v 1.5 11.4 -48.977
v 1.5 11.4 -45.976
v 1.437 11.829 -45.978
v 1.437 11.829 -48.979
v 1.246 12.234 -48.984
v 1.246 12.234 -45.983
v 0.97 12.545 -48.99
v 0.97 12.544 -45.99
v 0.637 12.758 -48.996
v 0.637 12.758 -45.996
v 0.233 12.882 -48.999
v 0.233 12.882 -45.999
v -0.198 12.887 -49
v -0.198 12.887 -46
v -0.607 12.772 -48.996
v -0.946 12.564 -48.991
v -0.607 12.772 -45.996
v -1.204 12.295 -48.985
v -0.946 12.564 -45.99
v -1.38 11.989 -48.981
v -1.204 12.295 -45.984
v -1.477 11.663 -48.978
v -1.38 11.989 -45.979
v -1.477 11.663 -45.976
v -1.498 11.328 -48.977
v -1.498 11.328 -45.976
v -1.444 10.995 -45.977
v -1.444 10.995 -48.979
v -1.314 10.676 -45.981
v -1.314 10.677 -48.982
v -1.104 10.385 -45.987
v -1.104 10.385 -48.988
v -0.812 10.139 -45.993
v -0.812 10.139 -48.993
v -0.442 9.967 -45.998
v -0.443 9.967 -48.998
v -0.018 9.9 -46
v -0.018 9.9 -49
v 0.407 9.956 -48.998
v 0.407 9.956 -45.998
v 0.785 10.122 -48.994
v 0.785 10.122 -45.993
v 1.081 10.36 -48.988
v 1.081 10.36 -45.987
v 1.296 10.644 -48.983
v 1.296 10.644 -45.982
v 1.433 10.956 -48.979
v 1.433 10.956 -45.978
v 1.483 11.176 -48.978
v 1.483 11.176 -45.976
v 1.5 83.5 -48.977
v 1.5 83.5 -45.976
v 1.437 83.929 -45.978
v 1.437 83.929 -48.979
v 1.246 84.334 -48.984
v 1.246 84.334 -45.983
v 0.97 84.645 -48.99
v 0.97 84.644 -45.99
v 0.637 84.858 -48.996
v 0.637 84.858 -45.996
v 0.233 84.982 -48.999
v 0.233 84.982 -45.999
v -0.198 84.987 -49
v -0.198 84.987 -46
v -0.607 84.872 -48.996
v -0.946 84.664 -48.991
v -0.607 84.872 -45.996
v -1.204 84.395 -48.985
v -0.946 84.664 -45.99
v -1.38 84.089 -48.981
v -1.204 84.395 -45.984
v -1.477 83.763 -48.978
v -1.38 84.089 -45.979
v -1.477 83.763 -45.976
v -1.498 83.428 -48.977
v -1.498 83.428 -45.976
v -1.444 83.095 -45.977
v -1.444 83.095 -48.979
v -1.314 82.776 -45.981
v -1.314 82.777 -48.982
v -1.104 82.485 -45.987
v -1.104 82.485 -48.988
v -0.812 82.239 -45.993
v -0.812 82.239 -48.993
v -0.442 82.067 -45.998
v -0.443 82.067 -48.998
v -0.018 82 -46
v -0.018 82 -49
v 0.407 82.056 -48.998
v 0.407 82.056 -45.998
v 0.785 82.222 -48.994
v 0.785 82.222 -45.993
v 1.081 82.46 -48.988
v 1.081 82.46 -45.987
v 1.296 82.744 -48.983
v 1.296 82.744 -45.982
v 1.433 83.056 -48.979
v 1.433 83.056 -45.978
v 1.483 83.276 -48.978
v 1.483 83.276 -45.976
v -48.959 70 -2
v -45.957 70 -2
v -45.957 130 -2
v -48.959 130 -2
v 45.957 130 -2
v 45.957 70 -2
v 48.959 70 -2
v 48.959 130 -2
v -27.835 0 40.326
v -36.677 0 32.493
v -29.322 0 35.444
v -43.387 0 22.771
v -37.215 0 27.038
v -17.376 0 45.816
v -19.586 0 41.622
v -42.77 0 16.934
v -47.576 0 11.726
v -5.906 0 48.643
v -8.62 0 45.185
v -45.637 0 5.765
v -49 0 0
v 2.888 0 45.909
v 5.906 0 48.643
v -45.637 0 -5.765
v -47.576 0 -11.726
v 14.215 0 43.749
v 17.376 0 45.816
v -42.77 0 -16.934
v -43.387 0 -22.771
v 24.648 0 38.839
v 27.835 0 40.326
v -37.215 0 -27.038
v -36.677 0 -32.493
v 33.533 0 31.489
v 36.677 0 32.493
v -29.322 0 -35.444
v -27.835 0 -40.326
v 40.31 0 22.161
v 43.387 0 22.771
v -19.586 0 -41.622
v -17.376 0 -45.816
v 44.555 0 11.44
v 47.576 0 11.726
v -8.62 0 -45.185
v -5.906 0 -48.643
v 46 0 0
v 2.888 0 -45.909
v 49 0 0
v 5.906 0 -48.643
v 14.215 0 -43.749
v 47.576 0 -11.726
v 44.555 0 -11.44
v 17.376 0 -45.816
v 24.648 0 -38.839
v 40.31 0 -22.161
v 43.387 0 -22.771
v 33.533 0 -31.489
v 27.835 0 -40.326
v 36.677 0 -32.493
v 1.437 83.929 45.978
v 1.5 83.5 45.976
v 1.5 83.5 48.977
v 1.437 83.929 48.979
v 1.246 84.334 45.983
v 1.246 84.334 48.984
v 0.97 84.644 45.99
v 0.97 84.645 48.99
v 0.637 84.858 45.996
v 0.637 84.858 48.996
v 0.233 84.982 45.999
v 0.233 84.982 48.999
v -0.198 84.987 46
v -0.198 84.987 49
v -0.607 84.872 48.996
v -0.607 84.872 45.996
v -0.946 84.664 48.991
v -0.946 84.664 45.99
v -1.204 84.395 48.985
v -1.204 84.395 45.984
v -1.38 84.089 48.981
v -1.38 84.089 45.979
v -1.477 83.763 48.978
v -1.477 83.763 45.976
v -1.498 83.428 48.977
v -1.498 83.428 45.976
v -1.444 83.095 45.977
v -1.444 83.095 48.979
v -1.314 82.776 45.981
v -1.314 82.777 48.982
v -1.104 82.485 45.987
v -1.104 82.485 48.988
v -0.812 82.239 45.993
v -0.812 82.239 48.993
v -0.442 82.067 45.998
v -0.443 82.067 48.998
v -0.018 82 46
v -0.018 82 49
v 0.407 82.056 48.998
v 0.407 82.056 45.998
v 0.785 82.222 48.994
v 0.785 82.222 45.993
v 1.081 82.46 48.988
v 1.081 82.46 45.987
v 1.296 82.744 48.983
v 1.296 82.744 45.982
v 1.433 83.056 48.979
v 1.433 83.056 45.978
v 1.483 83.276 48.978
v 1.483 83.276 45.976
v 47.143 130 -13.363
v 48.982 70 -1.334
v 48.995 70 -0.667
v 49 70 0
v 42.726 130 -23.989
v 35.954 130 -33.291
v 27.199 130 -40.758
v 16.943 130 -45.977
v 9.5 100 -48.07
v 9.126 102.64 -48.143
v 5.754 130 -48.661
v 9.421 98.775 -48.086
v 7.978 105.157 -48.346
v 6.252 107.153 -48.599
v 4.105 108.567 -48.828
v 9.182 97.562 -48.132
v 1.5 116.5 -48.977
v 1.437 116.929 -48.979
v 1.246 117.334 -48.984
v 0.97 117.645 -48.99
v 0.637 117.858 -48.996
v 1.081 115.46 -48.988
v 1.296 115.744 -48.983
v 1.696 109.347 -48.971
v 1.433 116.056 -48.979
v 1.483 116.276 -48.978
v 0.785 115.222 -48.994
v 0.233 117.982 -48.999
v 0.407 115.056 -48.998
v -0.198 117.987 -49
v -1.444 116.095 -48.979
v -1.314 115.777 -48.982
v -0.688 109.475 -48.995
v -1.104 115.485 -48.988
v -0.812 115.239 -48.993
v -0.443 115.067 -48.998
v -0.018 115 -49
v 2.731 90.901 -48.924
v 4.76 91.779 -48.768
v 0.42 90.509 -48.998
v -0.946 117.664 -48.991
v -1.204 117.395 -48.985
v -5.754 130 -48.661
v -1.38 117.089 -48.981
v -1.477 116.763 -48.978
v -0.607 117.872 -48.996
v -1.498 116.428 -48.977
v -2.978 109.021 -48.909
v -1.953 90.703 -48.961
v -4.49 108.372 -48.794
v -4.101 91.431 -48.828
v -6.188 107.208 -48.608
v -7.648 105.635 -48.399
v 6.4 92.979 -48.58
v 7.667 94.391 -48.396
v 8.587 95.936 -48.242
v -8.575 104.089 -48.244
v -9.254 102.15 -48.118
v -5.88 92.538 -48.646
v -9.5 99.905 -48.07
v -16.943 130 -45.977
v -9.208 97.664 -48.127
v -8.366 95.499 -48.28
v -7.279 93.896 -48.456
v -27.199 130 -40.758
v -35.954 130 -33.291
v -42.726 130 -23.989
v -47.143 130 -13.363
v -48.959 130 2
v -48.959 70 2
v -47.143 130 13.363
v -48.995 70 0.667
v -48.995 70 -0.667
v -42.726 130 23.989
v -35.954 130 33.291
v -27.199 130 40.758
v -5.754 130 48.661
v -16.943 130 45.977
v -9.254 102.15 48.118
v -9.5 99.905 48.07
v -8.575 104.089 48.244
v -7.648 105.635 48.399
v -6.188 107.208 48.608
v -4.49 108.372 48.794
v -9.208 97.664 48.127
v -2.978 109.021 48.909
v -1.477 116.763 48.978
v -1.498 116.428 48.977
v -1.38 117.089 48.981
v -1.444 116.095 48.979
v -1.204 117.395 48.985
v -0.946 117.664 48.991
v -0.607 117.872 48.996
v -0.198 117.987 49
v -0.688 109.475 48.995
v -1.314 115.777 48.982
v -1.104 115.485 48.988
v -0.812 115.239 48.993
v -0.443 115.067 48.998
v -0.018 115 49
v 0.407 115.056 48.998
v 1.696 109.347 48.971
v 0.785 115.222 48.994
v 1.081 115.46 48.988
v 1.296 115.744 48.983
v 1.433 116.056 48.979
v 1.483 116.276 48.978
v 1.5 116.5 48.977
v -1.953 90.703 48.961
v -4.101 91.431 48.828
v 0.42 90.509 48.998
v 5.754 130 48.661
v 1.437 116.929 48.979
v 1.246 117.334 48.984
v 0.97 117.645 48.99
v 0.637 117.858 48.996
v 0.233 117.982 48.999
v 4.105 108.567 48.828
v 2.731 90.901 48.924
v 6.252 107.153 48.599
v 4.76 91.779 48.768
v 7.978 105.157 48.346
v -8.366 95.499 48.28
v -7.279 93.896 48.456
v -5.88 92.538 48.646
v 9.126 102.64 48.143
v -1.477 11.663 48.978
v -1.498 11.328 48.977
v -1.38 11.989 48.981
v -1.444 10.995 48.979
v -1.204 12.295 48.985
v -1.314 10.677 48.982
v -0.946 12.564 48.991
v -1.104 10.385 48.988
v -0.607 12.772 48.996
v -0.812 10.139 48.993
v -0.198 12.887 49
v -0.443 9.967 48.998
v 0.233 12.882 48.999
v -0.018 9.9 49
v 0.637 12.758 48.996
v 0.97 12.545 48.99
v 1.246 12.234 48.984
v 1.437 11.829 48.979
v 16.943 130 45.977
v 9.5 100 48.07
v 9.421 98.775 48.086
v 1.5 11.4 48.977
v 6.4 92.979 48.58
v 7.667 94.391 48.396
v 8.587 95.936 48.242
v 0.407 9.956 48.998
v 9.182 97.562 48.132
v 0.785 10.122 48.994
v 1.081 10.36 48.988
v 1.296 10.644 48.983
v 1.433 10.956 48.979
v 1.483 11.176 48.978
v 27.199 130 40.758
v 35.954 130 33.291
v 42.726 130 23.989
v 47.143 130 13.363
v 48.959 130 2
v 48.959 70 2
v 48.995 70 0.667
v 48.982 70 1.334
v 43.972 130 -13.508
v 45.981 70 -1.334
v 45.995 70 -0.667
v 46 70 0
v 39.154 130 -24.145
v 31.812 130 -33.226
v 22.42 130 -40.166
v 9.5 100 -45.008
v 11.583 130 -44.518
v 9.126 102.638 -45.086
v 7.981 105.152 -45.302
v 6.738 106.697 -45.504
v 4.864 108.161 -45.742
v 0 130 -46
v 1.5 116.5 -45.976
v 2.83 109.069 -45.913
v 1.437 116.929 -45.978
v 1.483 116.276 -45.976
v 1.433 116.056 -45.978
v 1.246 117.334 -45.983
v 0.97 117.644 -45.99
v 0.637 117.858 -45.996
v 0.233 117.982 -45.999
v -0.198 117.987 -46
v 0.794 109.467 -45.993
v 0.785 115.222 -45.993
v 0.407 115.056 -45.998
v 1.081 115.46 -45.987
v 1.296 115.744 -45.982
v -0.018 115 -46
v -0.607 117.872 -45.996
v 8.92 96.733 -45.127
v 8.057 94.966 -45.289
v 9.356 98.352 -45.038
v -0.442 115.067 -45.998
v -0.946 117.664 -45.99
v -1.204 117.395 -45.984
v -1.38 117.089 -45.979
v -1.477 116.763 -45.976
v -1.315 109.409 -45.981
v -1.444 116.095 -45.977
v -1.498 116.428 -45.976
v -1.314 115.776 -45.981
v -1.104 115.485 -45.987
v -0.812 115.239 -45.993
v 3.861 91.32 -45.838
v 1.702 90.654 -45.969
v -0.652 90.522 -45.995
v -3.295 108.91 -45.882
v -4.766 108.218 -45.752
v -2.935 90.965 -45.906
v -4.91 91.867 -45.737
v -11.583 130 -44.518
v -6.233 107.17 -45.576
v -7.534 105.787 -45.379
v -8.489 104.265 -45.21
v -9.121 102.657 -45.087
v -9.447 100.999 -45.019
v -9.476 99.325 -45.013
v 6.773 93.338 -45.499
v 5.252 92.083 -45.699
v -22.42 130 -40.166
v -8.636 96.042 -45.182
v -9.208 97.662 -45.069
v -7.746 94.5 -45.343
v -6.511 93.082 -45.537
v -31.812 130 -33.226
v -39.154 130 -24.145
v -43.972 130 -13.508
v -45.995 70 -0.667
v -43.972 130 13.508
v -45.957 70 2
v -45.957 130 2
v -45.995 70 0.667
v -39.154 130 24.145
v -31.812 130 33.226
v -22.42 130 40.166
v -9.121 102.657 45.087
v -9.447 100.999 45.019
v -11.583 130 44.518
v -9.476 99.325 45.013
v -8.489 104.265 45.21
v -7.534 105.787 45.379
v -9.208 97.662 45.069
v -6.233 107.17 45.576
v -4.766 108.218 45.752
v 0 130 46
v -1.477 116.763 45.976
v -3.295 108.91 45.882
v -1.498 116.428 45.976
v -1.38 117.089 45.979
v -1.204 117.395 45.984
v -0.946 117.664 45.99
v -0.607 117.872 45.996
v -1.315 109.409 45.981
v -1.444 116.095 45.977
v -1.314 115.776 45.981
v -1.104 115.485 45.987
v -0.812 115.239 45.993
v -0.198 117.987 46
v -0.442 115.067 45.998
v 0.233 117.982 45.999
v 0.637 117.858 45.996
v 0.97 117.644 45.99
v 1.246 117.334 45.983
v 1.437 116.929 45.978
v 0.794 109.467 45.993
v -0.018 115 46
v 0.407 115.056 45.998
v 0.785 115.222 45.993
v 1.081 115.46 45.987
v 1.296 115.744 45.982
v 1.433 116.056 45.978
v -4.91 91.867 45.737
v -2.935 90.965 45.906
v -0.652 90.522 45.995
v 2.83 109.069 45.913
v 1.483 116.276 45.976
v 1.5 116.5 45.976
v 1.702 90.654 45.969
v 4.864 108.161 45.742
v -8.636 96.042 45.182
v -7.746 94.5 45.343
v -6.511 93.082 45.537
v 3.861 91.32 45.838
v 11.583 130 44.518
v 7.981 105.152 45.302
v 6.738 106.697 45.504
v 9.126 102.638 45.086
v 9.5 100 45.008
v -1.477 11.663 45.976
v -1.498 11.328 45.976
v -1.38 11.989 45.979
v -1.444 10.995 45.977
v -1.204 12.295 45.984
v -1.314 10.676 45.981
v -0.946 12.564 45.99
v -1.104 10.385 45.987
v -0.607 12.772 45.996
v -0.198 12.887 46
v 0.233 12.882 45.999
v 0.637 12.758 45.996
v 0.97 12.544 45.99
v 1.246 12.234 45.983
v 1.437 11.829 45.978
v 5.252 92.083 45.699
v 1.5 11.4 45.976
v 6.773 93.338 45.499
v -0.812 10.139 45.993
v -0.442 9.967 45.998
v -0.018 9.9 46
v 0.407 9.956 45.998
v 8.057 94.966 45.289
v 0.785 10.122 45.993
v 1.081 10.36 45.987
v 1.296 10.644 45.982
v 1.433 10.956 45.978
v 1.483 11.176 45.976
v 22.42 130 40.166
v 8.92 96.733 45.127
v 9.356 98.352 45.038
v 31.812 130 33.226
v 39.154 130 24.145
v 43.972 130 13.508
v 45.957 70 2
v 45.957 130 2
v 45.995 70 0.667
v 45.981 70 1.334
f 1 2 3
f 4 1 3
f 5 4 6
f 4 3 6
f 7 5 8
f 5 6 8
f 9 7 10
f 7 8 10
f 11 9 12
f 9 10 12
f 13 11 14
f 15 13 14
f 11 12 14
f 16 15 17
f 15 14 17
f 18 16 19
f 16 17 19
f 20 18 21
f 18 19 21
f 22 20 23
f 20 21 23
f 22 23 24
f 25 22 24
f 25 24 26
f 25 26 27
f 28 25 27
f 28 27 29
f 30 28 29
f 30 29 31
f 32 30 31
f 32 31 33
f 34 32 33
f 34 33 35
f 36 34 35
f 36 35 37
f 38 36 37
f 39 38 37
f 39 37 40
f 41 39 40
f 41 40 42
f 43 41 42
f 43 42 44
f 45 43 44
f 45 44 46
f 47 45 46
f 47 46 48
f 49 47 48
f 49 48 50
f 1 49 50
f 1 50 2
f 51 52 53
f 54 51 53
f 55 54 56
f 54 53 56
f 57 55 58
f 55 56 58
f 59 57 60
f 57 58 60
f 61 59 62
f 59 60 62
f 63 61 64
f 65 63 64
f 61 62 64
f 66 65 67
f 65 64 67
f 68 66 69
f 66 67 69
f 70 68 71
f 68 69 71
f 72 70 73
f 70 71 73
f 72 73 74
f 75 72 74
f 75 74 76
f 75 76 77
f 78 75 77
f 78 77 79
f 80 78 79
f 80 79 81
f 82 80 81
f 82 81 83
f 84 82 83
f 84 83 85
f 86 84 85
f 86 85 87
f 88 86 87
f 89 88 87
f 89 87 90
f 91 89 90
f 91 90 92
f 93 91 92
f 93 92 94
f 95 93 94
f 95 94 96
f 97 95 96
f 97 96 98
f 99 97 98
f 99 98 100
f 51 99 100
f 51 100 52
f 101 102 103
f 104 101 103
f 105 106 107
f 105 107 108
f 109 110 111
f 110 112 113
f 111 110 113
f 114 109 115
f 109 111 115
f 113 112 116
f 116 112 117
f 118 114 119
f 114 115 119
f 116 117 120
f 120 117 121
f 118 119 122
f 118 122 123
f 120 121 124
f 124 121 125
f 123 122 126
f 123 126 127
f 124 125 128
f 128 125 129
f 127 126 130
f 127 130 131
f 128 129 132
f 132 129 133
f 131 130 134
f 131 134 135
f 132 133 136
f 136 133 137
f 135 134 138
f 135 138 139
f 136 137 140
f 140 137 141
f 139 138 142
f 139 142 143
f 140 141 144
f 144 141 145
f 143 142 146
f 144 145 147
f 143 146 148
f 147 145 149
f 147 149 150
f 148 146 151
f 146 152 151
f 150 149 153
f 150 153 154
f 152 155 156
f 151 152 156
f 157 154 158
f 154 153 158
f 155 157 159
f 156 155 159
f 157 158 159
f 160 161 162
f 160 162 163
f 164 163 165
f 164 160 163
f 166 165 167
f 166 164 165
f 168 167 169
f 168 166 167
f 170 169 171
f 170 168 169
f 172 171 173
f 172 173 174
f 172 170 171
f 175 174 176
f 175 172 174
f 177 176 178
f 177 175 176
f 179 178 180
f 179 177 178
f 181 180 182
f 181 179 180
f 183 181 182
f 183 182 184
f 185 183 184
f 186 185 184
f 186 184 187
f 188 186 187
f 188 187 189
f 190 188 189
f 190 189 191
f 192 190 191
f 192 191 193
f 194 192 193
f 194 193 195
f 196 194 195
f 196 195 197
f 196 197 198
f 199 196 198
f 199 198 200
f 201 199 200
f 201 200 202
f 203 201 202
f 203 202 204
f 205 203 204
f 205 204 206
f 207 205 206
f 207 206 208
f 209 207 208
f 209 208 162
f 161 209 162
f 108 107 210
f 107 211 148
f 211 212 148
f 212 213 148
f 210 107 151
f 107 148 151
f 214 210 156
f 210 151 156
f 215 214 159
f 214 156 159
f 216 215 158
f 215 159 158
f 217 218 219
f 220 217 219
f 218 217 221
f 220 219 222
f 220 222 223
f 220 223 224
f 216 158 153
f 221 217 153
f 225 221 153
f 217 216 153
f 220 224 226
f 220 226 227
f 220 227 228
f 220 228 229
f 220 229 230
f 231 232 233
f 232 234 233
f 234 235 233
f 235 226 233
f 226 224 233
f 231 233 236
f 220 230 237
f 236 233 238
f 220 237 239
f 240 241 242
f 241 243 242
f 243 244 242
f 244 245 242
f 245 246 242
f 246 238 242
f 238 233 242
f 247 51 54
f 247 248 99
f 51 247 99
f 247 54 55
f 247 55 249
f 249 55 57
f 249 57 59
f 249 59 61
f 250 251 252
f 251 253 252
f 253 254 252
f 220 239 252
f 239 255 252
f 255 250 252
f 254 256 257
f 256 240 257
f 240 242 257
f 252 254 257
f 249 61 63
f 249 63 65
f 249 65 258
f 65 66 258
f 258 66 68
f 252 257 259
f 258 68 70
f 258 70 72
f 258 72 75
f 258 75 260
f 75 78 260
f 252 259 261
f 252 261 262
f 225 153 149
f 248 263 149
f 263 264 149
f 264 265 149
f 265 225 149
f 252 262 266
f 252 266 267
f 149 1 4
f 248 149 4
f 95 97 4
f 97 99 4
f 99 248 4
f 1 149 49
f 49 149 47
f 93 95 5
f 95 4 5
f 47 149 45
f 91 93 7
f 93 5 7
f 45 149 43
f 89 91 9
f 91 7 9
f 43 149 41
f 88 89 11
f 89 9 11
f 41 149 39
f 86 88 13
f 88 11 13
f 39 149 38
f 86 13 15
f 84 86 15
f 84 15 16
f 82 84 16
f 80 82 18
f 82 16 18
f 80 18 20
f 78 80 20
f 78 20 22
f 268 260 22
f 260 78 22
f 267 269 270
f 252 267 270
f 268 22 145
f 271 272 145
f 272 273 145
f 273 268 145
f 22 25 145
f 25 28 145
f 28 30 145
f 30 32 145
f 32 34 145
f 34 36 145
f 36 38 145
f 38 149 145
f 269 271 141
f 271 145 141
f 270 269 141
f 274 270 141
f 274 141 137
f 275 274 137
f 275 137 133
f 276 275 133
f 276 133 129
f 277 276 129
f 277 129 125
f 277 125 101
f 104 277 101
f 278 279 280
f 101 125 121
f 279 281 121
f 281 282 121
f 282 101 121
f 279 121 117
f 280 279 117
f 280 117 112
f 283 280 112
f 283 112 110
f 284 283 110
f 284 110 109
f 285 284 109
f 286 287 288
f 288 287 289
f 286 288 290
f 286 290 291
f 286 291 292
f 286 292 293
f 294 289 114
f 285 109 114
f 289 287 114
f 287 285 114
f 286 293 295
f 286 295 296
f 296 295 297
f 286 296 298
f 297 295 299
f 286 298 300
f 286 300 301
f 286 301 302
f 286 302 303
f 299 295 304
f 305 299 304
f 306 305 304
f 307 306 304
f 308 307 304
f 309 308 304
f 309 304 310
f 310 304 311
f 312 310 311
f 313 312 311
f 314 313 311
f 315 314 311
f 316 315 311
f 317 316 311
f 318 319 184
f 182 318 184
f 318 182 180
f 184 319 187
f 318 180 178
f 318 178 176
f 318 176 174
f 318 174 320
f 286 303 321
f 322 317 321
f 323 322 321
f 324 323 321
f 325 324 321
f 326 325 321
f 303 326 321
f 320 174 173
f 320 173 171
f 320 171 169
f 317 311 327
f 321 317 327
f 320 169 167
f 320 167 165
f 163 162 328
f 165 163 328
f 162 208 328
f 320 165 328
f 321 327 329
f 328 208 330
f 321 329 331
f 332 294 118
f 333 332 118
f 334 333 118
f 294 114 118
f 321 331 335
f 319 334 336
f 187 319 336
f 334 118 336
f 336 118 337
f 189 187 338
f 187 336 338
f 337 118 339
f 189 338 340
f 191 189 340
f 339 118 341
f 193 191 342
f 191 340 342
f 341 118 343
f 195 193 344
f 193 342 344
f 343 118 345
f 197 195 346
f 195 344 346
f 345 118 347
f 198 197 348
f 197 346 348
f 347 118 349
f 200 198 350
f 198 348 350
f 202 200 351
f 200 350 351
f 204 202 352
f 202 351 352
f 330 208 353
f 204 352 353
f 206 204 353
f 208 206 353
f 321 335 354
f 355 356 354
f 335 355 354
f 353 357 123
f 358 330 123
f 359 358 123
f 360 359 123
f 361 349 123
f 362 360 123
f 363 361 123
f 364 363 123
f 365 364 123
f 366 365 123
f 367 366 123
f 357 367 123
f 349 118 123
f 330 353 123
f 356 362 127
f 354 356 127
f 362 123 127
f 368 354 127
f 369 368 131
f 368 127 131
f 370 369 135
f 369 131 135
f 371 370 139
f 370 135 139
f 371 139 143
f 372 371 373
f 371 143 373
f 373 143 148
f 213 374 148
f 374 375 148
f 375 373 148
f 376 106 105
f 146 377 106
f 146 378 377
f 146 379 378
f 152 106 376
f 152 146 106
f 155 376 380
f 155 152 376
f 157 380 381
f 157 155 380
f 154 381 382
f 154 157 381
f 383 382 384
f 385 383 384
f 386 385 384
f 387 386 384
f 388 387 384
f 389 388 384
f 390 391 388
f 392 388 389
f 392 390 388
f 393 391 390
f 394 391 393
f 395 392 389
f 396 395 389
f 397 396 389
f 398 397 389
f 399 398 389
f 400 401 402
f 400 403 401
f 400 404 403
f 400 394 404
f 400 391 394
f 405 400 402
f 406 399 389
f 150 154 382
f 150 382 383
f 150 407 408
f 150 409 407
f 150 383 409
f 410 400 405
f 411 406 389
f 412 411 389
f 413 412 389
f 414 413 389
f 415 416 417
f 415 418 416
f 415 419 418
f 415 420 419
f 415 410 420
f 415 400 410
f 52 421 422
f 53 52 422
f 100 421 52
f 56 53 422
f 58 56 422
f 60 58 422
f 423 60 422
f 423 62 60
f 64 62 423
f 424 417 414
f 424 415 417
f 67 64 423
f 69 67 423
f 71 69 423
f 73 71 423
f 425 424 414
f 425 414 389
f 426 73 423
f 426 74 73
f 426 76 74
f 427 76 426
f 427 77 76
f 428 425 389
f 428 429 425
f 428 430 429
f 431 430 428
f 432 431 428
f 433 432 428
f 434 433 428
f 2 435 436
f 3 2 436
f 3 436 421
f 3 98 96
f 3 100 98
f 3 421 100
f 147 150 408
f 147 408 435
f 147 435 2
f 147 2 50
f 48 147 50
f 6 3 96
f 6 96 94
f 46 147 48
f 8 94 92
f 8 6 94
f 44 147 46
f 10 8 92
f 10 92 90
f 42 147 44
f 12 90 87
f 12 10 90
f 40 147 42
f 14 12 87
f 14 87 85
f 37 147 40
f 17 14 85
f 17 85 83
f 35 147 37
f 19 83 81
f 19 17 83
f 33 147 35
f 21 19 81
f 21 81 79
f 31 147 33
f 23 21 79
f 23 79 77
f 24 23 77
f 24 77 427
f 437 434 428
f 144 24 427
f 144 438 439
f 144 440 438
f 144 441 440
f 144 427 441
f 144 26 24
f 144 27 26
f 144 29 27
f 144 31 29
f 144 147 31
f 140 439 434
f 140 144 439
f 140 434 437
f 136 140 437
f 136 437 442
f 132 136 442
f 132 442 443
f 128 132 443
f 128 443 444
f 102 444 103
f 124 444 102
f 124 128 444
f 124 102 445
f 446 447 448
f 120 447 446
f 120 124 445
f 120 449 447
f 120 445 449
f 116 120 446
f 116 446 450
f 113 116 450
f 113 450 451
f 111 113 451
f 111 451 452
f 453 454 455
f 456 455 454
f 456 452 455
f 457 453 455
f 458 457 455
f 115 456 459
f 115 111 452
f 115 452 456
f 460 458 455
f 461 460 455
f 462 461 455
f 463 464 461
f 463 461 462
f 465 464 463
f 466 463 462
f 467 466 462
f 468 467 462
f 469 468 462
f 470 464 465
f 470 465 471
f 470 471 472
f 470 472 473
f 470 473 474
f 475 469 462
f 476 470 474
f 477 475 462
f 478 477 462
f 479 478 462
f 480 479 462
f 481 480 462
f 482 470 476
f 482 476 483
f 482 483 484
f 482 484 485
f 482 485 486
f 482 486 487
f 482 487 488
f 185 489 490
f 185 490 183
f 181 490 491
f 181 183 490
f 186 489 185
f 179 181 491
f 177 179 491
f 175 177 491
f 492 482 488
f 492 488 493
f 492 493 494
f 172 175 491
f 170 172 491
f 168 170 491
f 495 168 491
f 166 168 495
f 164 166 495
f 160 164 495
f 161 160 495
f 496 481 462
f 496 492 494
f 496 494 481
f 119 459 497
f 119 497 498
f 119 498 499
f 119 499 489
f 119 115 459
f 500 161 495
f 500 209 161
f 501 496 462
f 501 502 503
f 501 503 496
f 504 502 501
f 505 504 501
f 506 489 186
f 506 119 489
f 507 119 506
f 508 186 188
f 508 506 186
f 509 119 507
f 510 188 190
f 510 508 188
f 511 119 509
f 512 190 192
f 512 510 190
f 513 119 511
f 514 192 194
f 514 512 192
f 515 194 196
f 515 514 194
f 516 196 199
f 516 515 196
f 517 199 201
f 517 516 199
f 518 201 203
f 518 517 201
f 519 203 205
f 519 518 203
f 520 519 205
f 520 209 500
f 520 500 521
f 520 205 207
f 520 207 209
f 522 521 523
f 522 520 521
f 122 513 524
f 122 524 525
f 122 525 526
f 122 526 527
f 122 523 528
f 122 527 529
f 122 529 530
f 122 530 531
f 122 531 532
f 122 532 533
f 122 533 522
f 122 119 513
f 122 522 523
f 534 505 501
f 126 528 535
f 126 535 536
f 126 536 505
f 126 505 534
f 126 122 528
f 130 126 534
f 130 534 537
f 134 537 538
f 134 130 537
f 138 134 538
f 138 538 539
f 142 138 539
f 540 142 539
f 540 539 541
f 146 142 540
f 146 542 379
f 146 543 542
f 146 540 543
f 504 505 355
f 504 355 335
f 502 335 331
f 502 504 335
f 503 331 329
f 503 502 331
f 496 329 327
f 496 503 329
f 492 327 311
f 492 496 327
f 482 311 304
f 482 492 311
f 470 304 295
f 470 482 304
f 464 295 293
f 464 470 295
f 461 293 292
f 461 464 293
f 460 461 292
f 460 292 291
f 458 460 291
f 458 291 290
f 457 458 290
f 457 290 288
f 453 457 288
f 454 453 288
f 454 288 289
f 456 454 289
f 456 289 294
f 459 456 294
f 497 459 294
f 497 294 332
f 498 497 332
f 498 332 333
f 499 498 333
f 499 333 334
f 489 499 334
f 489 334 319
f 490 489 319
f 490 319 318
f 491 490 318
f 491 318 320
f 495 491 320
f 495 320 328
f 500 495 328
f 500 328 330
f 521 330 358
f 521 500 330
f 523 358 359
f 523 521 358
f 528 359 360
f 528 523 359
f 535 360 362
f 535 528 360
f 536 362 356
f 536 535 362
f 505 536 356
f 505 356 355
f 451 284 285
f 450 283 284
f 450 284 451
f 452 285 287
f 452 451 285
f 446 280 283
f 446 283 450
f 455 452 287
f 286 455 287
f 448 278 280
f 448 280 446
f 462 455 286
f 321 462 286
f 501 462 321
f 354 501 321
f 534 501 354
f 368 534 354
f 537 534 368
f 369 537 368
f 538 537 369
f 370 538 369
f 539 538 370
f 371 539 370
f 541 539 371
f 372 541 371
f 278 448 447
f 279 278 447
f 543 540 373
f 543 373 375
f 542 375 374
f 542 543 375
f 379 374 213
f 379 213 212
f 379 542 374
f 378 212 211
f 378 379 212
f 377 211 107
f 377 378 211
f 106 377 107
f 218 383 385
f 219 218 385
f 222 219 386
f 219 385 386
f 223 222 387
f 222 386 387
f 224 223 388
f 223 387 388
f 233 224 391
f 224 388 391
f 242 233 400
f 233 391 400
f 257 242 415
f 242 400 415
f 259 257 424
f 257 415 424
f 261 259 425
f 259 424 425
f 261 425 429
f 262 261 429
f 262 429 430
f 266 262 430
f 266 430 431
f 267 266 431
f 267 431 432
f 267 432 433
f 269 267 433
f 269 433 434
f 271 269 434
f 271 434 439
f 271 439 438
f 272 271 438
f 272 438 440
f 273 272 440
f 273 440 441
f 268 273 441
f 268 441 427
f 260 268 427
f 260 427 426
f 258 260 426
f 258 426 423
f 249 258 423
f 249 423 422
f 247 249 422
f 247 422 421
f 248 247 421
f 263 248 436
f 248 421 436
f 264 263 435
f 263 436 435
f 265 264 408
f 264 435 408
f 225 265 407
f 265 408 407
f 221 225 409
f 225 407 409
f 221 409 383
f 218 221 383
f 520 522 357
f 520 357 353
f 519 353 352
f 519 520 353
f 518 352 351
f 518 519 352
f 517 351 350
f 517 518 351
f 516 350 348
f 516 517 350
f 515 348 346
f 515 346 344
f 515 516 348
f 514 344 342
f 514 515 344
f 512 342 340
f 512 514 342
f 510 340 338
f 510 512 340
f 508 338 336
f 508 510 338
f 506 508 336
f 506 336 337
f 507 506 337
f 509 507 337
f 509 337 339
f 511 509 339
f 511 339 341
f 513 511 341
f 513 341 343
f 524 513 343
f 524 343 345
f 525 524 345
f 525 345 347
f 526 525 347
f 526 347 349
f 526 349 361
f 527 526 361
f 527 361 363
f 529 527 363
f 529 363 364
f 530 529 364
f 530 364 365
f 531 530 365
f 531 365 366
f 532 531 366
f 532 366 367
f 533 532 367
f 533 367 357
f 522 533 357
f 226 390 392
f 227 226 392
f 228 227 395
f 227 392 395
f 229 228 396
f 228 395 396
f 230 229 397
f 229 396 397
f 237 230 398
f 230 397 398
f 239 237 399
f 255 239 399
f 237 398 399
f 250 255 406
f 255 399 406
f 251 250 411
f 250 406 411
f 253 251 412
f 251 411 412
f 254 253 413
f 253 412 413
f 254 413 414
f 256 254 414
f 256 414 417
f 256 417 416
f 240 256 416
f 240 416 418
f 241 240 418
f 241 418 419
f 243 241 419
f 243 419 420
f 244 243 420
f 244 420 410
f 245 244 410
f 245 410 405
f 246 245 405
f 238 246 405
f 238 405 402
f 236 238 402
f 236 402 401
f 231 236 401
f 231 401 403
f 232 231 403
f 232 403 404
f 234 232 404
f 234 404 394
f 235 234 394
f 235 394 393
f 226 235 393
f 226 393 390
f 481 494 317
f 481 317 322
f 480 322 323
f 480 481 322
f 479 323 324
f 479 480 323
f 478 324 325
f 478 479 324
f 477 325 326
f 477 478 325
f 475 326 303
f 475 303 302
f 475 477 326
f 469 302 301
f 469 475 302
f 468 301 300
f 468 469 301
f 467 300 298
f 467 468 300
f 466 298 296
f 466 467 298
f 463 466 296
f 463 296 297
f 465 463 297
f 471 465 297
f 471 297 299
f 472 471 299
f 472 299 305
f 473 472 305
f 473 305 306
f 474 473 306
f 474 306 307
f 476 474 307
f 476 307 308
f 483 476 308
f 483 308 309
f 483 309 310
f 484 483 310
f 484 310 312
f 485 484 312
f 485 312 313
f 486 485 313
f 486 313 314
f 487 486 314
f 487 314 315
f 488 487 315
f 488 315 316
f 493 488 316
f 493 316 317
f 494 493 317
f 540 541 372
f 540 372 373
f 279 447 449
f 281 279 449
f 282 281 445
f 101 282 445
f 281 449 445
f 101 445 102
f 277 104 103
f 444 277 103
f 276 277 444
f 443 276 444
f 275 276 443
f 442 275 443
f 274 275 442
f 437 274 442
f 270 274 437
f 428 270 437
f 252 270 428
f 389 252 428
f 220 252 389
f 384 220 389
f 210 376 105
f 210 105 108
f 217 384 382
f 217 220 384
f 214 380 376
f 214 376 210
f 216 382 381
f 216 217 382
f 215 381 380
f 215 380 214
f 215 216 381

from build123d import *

# Parameters (mm, degrees)
SKETCH1_R               = 49
SKETCH1_R_2             = 46
BOSS_EXTRUDE1_DEPTH     = 130
SKETCH2_R               = 1.5
CUT_EXTRUDE1_DEPTH      = 50
CUT_EXTRUDE1_DEPTH_BACK = 50
SKETCH3_R               = 9.5
CUT_EXTRUDE2_DEPTH      = 50.000000109
CUT_EXTRUDE2_DEPTH_BACK = 50.000000109
SKETCH4_R               = 1.5
CUT_EXTRUDE3_DEPTH      = 50.000000109
CUT_EXTRUDE3_DEPTH_BACK = 50.000000109
CUT_EXTRUDE4_DEPTH      = 70
CUT_EXTRUDE4_DEPTH_BACK = 70


with BuildPart() as part:
    # Sketch1 → Boss-Extrude1 (new body)
    with BuildSketch(Plane(origin=(0, 0, 0), x_dir=(1, 0, 0), z_dir=(0, 1, 0))):
        Circle(SKETCH1_R)
        Circle(SKETCH1_R_2, mode=Mode.SUBTRACT)
    extrude(amount=BOSS_EXTRUDE1_DEPTH)

    # Sketch2 → Cut-Extrude1 (cut, two sides)
    with BuildSketch(Plane.XY) as cut_extrude1_sk:
        with Locations((0, 11.4)):
            Circle(SKETCH2_R)
    extrude(amount=CUT_EXTRUDE1_DEPTH, mode=Mode.SUBTRACT)
    extrude(cut_extrude1_sk.sketch, amount=-CUT_EXTRUDE1_DEPTH_BACK, mode=Mode.SUBTRACT)

    # Sketch3 → Cut-Extrude2 (cut, two sides)
    with BuildSketch(Plane.XY) as cut_extrude2_sk:
        with Locations((0, 100)):
            Circle(SKETCH3_R)
    extrude(amount=CUT_EXTRUDE2_DEPTH, mode=Mode.SUBTRACT)
    extrude(cut_extrude2_sk.sketch, amount=-CUT_EXTRUDE2_DEPTH_BACK, mode=Mode.SUBTRACT)

    # Sketch4 → Cut-Extrude3 (cut, two sides)
    with BuildSketch(Plane.XY) as cut_extrude3_sk:
        with Locations((0, 83.5)):
            Circle(SKETCH4_R)
        with Locations((0, 116.5)):
            Circle(SKETCH4_R)
    extrude(amount=CUT_EXTRUDE3_DEPTH, mode=Mode.SUBTRACT)
    extrude(cut_extrude3_sk.sketch, amount=-CUT_EXTRUDE3_DEPTH_BACK, mode=Mode.SUBTRACT)

    # Sketch5 → Cut-Extrude4 (cut, two sides)
    with BuildSketch(Plane(origin=(0, 0, 0), x_dir=(0, 0, -1), z_dir=(1, 0, 0))) as cut_extrude4_sk:
        Polygon((0, 70), (2, 70), (2, 130), (-2, 130), (-2, 70), align=None)
    extrude(amount=CUT_EXTRUDE4_DEPTH, mode=Mode.SUBTRACT)
    extrude(cut_extrude4_sk.sketch, amount=-CUT_EXTRUDE4_DEPTH_BACK, mode=Mode.SUBTRACT)


solid = part.part
